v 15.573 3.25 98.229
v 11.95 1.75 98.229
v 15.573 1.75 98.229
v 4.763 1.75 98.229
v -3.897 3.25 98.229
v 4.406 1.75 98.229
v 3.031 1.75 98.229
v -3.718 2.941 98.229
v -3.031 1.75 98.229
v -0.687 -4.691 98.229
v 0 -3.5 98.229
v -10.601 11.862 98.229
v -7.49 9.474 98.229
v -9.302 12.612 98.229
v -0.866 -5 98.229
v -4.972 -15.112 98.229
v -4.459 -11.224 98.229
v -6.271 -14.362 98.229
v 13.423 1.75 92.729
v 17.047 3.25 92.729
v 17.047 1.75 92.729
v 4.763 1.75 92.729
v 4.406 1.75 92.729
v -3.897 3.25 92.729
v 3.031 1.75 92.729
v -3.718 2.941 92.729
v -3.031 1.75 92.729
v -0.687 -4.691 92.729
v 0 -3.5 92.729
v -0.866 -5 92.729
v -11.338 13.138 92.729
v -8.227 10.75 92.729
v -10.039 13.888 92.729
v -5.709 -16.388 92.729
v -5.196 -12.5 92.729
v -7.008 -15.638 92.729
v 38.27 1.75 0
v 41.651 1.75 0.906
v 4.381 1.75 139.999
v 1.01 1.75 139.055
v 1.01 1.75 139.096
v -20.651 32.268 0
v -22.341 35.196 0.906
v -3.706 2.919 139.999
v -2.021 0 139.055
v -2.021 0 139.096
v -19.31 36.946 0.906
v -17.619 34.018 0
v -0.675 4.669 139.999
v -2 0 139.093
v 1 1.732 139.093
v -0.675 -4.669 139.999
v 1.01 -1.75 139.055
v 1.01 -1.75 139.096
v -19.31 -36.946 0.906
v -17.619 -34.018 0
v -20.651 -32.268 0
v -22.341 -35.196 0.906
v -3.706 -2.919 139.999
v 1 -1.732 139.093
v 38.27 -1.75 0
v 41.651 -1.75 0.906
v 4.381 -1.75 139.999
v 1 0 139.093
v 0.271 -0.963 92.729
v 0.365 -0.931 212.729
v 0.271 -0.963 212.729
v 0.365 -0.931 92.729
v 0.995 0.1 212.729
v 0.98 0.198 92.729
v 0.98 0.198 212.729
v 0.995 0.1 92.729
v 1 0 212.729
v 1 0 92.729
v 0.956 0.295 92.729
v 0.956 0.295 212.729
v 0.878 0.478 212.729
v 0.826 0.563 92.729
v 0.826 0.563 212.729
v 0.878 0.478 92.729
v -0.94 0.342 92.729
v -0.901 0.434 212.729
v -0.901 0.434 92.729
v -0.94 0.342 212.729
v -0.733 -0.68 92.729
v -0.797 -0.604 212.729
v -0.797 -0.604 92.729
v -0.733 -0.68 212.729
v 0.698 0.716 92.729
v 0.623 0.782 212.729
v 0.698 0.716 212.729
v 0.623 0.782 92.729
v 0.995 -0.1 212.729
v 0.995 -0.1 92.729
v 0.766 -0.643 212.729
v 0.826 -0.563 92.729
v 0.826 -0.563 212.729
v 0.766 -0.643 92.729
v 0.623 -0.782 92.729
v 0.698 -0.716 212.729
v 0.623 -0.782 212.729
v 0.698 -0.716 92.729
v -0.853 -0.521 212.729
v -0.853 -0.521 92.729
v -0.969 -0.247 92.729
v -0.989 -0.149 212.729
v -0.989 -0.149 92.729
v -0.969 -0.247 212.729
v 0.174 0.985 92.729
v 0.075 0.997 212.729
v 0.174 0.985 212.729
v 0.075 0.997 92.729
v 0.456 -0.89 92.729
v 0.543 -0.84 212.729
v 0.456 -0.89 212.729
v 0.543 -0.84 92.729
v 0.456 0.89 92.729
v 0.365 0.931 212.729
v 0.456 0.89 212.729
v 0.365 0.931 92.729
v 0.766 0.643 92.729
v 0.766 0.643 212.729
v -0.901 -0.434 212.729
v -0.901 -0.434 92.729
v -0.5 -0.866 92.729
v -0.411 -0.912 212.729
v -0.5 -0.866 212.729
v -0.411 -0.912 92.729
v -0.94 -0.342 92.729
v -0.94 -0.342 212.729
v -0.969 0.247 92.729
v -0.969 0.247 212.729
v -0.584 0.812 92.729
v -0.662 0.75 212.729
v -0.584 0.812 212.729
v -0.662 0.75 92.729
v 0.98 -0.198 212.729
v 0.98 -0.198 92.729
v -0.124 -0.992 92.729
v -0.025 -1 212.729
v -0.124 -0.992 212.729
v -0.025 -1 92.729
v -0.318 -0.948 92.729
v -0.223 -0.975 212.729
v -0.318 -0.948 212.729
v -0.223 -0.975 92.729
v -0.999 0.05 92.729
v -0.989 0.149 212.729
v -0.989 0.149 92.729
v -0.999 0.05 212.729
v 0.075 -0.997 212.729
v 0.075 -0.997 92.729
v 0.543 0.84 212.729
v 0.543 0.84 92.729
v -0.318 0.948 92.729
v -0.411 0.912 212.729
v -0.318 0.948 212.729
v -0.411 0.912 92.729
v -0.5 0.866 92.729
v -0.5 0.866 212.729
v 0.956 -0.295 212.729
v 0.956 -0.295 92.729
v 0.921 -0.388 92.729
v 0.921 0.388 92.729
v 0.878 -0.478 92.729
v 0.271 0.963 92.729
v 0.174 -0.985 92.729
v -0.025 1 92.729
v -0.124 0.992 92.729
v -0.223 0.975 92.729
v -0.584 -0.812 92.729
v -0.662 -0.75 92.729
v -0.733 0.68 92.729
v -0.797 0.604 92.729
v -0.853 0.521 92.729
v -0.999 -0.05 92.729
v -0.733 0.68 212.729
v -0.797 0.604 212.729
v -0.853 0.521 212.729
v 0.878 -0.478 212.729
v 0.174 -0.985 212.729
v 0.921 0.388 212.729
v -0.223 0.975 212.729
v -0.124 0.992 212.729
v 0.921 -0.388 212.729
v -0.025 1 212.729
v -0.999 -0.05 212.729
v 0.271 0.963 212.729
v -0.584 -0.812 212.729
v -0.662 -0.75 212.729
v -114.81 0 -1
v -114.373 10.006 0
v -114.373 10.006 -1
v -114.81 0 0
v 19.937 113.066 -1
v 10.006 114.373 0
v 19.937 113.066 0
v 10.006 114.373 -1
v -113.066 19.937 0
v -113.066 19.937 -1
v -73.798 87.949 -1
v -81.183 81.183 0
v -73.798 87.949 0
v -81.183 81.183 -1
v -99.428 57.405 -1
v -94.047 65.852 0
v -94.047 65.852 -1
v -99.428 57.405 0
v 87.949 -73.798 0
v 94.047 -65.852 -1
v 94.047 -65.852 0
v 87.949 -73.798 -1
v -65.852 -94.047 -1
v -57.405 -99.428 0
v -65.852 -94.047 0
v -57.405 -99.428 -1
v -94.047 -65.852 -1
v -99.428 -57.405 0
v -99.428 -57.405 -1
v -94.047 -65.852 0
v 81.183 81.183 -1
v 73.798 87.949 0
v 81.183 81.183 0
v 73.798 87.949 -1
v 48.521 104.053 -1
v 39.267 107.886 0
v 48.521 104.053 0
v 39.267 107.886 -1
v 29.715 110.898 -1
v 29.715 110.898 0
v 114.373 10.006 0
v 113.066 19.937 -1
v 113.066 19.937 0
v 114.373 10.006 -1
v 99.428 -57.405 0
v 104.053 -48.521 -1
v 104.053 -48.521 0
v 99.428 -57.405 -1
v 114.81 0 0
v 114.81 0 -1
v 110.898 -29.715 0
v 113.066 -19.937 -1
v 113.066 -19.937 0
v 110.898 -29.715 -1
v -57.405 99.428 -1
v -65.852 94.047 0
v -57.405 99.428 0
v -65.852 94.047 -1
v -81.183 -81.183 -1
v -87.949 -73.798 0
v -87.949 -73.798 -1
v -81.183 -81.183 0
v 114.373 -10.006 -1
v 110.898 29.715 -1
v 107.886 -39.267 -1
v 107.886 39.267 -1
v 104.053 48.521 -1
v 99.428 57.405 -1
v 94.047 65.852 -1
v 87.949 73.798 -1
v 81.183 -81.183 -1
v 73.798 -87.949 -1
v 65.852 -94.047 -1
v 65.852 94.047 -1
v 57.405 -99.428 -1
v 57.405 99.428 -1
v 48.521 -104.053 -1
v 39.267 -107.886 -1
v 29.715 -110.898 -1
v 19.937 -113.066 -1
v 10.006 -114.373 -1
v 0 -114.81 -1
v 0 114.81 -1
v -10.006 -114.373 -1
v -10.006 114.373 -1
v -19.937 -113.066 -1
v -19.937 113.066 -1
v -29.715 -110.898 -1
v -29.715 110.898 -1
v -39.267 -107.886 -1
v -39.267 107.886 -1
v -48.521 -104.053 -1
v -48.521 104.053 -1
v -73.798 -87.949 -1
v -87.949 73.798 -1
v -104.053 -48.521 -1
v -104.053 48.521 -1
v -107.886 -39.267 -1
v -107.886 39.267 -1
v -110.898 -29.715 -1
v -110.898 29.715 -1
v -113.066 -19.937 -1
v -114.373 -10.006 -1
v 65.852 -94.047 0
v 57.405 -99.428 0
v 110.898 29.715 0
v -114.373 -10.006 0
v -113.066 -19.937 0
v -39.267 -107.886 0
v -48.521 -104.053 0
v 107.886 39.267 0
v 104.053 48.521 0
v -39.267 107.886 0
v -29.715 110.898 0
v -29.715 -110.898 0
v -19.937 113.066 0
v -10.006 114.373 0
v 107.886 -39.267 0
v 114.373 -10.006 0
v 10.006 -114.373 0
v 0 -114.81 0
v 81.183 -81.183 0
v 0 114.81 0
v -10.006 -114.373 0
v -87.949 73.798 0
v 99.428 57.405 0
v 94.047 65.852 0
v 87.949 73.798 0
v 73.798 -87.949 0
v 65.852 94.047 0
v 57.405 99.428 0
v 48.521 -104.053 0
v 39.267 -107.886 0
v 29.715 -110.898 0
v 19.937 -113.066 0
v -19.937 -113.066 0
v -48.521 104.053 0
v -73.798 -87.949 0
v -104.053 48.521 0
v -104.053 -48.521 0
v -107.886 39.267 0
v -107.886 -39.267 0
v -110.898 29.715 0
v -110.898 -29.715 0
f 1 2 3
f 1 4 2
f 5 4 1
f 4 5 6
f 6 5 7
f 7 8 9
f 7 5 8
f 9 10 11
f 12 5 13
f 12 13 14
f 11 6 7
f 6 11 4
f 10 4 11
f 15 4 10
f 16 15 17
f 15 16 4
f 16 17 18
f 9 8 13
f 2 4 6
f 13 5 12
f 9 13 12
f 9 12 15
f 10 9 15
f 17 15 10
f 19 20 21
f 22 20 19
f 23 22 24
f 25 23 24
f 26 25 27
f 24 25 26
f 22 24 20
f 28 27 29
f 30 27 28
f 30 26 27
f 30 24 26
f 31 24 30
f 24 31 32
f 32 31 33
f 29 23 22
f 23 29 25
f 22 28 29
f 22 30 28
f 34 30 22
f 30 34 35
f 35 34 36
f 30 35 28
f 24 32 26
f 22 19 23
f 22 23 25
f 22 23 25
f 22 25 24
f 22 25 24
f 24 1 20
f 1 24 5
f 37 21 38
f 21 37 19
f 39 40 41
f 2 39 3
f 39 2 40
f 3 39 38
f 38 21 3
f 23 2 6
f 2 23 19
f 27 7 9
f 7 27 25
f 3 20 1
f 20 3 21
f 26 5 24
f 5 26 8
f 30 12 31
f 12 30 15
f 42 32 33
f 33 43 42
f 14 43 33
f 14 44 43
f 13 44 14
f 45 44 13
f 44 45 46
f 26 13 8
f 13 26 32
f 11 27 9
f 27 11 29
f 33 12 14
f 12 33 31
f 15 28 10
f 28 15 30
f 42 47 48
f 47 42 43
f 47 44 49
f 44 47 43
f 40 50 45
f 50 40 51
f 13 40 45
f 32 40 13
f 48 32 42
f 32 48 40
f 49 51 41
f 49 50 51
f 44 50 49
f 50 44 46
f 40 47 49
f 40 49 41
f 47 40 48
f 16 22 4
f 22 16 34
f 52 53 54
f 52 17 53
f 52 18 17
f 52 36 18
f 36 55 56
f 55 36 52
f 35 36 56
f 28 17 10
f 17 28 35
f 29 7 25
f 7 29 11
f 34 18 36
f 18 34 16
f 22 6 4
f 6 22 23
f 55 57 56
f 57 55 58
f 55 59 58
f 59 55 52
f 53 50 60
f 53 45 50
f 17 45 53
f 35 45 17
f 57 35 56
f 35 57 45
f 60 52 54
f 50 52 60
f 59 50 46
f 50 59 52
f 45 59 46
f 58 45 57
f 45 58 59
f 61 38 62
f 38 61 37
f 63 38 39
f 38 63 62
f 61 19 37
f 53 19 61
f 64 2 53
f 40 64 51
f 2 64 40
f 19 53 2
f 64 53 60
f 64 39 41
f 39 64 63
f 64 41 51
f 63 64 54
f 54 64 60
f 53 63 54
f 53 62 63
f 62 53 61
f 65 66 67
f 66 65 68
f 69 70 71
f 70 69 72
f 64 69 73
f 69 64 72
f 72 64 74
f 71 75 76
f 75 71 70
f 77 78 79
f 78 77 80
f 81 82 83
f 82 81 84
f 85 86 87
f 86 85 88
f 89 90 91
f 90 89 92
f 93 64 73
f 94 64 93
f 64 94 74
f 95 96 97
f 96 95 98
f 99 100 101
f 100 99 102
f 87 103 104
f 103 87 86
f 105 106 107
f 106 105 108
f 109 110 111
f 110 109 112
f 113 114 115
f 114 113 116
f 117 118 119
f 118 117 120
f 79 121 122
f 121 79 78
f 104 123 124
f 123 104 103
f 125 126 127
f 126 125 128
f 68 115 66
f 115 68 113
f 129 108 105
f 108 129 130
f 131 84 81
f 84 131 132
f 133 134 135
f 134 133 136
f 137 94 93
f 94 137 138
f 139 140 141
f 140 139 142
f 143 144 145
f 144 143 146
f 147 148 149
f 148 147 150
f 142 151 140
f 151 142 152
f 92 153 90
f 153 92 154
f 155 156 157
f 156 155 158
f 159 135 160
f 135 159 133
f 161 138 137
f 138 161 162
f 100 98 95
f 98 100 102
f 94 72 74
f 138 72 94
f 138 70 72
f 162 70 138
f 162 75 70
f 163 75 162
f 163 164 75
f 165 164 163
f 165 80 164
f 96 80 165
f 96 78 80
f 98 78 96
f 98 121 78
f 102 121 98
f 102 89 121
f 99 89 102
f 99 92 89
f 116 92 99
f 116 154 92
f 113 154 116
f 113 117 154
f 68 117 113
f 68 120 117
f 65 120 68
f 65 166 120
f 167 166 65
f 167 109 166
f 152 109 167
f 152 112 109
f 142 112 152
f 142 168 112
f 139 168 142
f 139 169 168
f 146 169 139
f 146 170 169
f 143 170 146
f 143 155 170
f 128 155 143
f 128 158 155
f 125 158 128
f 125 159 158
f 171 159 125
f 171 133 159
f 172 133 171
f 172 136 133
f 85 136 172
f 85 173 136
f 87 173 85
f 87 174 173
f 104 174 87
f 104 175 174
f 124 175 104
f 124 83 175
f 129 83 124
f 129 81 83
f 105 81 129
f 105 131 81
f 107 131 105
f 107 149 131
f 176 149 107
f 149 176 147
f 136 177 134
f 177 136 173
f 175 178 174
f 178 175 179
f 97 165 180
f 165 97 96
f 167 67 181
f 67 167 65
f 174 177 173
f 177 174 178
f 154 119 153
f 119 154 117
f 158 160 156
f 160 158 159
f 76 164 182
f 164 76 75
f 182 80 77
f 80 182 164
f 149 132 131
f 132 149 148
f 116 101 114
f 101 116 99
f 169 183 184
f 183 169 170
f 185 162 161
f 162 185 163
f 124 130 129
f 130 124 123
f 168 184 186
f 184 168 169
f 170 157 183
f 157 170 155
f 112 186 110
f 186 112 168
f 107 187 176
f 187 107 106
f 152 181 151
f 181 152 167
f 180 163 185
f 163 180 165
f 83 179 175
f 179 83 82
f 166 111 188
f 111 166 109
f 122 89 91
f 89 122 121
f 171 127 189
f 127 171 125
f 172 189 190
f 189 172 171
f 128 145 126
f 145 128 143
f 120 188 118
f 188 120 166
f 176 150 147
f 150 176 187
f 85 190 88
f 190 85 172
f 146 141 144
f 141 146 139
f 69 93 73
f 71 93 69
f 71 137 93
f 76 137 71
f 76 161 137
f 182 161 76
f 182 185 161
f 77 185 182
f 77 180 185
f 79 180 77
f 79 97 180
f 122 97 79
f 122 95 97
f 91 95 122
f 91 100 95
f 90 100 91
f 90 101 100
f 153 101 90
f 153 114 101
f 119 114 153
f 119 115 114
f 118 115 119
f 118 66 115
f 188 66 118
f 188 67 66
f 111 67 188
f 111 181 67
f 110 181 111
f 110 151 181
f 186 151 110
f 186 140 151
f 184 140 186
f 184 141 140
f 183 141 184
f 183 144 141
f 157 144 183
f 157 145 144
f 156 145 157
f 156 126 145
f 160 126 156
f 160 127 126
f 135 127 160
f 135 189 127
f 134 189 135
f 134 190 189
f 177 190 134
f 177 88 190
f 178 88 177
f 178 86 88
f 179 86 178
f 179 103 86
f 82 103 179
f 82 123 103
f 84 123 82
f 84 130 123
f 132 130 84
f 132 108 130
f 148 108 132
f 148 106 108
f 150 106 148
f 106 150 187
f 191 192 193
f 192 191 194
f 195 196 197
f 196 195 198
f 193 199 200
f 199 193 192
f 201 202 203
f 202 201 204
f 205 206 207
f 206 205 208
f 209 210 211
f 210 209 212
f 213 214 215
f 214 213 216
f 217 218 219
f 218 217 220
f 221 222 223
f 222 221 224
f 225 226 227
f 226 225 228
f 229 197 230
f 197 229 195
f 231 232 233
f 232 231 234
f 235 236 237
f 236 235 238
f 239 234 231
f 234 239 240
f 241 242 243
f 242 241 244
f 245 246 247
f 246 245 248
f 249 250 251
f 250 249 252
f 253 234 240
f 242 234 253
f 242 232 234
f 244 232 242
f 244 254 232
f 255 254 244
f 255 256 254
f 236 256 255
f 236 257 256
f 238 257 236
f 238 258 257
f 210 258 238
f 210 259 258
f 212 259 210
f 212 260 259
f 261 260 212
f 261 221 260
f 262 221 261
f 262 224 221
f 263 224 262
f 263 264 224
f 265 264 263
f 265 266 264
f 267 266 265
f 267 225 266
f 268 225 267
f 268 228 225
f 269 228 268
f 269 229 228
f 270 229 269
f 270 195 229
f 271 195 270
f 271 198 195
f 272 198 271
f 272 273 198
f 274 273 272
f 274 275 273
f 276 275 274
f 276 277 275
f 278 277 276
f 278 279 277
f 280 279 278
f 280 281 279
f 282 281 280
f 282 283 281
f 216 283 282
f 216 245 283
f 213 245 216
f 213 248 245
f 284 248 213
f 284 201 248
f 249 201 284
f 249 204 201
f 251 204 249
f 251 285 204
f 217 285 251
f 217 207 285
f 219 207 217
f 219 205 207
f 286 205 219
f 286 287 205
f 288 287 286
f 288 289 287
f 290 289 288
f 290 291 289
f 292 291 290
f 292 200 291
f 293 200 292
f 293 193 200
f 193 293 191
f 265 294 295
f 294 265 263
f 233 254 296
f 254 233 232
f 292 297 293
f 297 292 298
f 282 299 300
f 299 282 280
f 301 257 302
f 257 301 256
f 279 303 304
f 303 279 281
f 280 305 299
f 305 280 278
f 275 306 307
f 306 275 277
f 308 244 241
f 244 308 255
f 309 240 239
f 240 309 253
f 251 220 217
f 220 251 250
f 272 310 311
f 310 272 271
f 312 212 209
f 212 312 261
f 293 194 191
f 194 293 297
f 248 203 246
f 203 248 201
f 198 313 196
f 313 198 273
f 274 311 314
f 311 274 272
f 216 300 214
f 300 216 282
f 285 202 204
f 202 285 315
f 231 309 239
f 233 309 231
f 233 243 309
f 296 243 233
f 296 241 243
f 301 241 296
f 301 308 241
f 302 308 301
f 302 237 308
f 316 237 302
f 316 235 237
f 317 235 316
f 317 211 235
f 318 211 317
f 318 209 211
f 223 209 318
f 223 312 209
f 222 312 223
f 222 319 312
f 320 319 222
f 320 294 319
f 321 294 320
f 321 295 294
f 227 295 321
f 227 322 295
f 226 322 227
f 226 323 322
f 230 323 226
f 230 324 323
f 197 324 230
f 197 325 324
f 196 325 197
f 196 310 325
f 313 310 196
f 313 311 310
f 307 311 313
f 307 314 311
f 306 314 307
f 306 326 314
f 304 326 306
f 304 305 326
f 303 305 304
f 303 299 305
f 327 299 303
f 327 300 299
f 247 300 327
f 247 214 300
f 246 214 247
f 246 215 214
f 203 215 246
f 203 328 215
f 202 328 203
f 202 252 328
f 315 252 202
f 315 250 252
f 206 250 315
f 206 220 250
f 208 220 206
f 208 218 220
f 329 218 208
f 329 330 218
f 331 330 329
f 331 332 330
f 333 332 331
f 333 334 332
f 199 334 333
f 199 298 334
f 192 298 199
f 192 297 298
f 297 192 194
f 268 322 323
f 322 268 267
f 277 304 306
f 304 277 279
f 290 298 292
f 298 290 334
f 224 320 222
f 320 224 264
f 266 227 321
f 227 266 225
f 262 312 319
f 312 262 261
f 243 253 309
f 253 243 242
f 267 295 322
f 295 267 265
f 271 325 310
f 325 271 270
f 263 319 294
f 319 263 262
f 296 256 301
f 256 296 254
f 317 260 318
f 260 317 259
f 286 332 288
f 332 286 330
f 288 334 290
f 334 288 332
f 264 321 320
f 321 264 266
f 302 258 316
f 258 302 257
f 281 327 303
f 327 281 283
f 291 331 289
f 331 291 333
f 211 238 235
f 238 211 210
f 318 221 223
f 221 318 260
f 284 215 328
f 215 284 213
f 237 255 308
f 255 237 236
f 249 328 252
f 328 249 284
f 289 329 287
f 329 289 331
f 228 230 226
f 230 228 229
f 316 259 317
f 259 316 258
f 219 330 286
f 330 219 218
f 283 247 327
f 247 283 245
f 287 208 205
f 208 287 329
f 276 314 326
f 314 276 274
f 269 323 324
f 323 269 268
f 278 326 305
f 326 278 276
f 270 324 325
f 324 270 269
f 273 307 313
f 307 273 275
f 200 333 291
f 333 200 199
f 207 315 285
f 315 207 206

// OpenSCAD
// file: signal-tower.scad
use <../common/labeling.scad>

$fs = 0.1;
$fa = 5;

// All units in inches
leg_length = 12 * 12;
// From ground
leg_angle = 75;
leg_size = [leg_length, 3.5, 3.5];

pipe_diameter = 2;
pipe_length = 12 * 10;

tower_height = leg_length * sin(leg_angle);
tower_radius = (leg_length * cos(leg_angle)
                + pipe_diameter / 2);

brace_height = tower_height * 2 / 3;

brace_thickness = 1.5;
brace_length_rear =
    (leg_size.y / 2) / cos(30)
    + (brace_thickness + leg_size.y / 2) * tan(30);
brace_length =
    // leg span without pipe shift, because shift actually makes the
    // triangle taller, though we're concerned with the end of the
    // legs as the height
    (((tower_height - brace_height) / tower_height)
     * (tower_radius - pipe_diameter / 2))
    // account for pipe shift in leg span
    + pipe_diameter / 2
    // width of leg at angle
    + leg_size.z / sin(leg_angle)
    + brace_length_rear;
brace_size = [brace_length, brace_thickness, 5.5];

module leg() {
    color("#669900")
        translate([pipe_diameter / 2, -leg_size.y / 2, tower_height])
        rotate([0, leg_angle, 0])
        cube(leg_size);
}

module pipe() {
    color("#cccccc") cylinder(h=pipe_length, d=pipe_diameter);
}

module brace() {
    translate([-brace_length_rear, leg_size.y / 2, brace_height])
    difference() {
        cube(brace_size);

        translate([brace_length, 0, 0])
            rotate([0, leg_angle, 0])
            translate([-brace_length / 2, -brace_size.y * 0.05, 0])
            cube(brace_size * 1.1);


        translate([0, brace_size.y, 0])
            rotate([0, 0, -60])
            translate([-brace_length / 2,
                       -brace_size.y * 1.1,
                       -brace_size.z * 0.05])
            cube(brace_size * 1.1);
    }
}

module tower() {
    leg(); brace();
    rotate([0, 0, 120]) { leg(); brace(); }
    rotate([0, 0, -120]) { leg(); brace(); }
    translate([0, 0, brace_height]) pipe();
}

module ground() {
    color("#cccc0099")
        translate([0, 0, -1])
        cylinder(r=tower_radius * 3, h=1);
}

tower();
//ground();

sizeLabel(tower_radius, over=true);
sizeLabel(tower_height, rotation=-90);
sizeLabel(tower_height + pipe_length - (tower_height - brace_height),
          rotation=-90,
          over=true);
translate([-brace_length_rear, leg_size.y / 2 + brace_thickness, brace_height]) sizeLabel(brace_length);
// file: ../common/echo-camera-arg.scad
// This file supports the build process by converting a files $vp*
// settings to a --camera argument to be used at the commandline (see
// Makefile.common and choose_camera.zsh).

// Two ways to used this file:
//
//    include <../common/echo-camera-arg.scad>
//
// OR
//
//    use <../common/echo-camera-arg.scad>
//    echo(cameraArg());

// $vpt/r/d in a formatted --camera argument, for the build to use to
// avoid warnings about them overriding --autocenter and
// --viewall. Use this as:
//
//     echo(cameraArg());
//
// The echo can't be in here, because OpenSCAD expects to find a
// module, not a function, if the return value is ignored. That means
// it prints a warning about being unable to find a *module* named
// camerArg.
function cameraArg() =
    str("--camera=",
        $vpt[0],",",$vpt[1],",",$vpt[2],",",
        $vpr[0],",",$vpr[1],",",$vpr[2],",",
        $vpd);

// Doing the echo here means adding this to a file is a one-liner via
// include.
echo(cameraArg());
// main file
// The assembled view.
//cmdline: --imgsize=2048,1536
include <../common/echo-camera-arg.scad>

use <signal-tower.scad>

$vpt = [ -12.91, 65.39, 270.17 ];
$vpr = [ 74.60, 0.00, 14.70 ];
$vpd = 1618.92;
$vpf = 22.50;

tower($use_finish_colors=true);
ground();

// Add a call to this module to put an overly simplified version of
// Starlink's satellite dish on top of the tower.
starlink_dish_diameter = 23.5; // inches
starlink_dish_depth = 3; // inches
starlink_pipe_diameter = 1.5; //inches
starlink_pipe_length = 16; // inches
starlink_pipe_inset = 2; // inches
module example_starlink_dish() {
    color("#eeeeee")
        translate([0,
                   0,
                   assembled_height()
                   + starlink_pipe_length
                   - starlink_pipe_inset])
        rotate([90, 0, 0])
        cylinder(h=starlink_dish_depth, d=starlink_dish_diameter);

    color("#000000")
        translate([0, 0, assembled_height() - starlink_pipe_inset])
        cylinder(h=starlink_pipe_length, d=starlink_pipe_diameter);
}
